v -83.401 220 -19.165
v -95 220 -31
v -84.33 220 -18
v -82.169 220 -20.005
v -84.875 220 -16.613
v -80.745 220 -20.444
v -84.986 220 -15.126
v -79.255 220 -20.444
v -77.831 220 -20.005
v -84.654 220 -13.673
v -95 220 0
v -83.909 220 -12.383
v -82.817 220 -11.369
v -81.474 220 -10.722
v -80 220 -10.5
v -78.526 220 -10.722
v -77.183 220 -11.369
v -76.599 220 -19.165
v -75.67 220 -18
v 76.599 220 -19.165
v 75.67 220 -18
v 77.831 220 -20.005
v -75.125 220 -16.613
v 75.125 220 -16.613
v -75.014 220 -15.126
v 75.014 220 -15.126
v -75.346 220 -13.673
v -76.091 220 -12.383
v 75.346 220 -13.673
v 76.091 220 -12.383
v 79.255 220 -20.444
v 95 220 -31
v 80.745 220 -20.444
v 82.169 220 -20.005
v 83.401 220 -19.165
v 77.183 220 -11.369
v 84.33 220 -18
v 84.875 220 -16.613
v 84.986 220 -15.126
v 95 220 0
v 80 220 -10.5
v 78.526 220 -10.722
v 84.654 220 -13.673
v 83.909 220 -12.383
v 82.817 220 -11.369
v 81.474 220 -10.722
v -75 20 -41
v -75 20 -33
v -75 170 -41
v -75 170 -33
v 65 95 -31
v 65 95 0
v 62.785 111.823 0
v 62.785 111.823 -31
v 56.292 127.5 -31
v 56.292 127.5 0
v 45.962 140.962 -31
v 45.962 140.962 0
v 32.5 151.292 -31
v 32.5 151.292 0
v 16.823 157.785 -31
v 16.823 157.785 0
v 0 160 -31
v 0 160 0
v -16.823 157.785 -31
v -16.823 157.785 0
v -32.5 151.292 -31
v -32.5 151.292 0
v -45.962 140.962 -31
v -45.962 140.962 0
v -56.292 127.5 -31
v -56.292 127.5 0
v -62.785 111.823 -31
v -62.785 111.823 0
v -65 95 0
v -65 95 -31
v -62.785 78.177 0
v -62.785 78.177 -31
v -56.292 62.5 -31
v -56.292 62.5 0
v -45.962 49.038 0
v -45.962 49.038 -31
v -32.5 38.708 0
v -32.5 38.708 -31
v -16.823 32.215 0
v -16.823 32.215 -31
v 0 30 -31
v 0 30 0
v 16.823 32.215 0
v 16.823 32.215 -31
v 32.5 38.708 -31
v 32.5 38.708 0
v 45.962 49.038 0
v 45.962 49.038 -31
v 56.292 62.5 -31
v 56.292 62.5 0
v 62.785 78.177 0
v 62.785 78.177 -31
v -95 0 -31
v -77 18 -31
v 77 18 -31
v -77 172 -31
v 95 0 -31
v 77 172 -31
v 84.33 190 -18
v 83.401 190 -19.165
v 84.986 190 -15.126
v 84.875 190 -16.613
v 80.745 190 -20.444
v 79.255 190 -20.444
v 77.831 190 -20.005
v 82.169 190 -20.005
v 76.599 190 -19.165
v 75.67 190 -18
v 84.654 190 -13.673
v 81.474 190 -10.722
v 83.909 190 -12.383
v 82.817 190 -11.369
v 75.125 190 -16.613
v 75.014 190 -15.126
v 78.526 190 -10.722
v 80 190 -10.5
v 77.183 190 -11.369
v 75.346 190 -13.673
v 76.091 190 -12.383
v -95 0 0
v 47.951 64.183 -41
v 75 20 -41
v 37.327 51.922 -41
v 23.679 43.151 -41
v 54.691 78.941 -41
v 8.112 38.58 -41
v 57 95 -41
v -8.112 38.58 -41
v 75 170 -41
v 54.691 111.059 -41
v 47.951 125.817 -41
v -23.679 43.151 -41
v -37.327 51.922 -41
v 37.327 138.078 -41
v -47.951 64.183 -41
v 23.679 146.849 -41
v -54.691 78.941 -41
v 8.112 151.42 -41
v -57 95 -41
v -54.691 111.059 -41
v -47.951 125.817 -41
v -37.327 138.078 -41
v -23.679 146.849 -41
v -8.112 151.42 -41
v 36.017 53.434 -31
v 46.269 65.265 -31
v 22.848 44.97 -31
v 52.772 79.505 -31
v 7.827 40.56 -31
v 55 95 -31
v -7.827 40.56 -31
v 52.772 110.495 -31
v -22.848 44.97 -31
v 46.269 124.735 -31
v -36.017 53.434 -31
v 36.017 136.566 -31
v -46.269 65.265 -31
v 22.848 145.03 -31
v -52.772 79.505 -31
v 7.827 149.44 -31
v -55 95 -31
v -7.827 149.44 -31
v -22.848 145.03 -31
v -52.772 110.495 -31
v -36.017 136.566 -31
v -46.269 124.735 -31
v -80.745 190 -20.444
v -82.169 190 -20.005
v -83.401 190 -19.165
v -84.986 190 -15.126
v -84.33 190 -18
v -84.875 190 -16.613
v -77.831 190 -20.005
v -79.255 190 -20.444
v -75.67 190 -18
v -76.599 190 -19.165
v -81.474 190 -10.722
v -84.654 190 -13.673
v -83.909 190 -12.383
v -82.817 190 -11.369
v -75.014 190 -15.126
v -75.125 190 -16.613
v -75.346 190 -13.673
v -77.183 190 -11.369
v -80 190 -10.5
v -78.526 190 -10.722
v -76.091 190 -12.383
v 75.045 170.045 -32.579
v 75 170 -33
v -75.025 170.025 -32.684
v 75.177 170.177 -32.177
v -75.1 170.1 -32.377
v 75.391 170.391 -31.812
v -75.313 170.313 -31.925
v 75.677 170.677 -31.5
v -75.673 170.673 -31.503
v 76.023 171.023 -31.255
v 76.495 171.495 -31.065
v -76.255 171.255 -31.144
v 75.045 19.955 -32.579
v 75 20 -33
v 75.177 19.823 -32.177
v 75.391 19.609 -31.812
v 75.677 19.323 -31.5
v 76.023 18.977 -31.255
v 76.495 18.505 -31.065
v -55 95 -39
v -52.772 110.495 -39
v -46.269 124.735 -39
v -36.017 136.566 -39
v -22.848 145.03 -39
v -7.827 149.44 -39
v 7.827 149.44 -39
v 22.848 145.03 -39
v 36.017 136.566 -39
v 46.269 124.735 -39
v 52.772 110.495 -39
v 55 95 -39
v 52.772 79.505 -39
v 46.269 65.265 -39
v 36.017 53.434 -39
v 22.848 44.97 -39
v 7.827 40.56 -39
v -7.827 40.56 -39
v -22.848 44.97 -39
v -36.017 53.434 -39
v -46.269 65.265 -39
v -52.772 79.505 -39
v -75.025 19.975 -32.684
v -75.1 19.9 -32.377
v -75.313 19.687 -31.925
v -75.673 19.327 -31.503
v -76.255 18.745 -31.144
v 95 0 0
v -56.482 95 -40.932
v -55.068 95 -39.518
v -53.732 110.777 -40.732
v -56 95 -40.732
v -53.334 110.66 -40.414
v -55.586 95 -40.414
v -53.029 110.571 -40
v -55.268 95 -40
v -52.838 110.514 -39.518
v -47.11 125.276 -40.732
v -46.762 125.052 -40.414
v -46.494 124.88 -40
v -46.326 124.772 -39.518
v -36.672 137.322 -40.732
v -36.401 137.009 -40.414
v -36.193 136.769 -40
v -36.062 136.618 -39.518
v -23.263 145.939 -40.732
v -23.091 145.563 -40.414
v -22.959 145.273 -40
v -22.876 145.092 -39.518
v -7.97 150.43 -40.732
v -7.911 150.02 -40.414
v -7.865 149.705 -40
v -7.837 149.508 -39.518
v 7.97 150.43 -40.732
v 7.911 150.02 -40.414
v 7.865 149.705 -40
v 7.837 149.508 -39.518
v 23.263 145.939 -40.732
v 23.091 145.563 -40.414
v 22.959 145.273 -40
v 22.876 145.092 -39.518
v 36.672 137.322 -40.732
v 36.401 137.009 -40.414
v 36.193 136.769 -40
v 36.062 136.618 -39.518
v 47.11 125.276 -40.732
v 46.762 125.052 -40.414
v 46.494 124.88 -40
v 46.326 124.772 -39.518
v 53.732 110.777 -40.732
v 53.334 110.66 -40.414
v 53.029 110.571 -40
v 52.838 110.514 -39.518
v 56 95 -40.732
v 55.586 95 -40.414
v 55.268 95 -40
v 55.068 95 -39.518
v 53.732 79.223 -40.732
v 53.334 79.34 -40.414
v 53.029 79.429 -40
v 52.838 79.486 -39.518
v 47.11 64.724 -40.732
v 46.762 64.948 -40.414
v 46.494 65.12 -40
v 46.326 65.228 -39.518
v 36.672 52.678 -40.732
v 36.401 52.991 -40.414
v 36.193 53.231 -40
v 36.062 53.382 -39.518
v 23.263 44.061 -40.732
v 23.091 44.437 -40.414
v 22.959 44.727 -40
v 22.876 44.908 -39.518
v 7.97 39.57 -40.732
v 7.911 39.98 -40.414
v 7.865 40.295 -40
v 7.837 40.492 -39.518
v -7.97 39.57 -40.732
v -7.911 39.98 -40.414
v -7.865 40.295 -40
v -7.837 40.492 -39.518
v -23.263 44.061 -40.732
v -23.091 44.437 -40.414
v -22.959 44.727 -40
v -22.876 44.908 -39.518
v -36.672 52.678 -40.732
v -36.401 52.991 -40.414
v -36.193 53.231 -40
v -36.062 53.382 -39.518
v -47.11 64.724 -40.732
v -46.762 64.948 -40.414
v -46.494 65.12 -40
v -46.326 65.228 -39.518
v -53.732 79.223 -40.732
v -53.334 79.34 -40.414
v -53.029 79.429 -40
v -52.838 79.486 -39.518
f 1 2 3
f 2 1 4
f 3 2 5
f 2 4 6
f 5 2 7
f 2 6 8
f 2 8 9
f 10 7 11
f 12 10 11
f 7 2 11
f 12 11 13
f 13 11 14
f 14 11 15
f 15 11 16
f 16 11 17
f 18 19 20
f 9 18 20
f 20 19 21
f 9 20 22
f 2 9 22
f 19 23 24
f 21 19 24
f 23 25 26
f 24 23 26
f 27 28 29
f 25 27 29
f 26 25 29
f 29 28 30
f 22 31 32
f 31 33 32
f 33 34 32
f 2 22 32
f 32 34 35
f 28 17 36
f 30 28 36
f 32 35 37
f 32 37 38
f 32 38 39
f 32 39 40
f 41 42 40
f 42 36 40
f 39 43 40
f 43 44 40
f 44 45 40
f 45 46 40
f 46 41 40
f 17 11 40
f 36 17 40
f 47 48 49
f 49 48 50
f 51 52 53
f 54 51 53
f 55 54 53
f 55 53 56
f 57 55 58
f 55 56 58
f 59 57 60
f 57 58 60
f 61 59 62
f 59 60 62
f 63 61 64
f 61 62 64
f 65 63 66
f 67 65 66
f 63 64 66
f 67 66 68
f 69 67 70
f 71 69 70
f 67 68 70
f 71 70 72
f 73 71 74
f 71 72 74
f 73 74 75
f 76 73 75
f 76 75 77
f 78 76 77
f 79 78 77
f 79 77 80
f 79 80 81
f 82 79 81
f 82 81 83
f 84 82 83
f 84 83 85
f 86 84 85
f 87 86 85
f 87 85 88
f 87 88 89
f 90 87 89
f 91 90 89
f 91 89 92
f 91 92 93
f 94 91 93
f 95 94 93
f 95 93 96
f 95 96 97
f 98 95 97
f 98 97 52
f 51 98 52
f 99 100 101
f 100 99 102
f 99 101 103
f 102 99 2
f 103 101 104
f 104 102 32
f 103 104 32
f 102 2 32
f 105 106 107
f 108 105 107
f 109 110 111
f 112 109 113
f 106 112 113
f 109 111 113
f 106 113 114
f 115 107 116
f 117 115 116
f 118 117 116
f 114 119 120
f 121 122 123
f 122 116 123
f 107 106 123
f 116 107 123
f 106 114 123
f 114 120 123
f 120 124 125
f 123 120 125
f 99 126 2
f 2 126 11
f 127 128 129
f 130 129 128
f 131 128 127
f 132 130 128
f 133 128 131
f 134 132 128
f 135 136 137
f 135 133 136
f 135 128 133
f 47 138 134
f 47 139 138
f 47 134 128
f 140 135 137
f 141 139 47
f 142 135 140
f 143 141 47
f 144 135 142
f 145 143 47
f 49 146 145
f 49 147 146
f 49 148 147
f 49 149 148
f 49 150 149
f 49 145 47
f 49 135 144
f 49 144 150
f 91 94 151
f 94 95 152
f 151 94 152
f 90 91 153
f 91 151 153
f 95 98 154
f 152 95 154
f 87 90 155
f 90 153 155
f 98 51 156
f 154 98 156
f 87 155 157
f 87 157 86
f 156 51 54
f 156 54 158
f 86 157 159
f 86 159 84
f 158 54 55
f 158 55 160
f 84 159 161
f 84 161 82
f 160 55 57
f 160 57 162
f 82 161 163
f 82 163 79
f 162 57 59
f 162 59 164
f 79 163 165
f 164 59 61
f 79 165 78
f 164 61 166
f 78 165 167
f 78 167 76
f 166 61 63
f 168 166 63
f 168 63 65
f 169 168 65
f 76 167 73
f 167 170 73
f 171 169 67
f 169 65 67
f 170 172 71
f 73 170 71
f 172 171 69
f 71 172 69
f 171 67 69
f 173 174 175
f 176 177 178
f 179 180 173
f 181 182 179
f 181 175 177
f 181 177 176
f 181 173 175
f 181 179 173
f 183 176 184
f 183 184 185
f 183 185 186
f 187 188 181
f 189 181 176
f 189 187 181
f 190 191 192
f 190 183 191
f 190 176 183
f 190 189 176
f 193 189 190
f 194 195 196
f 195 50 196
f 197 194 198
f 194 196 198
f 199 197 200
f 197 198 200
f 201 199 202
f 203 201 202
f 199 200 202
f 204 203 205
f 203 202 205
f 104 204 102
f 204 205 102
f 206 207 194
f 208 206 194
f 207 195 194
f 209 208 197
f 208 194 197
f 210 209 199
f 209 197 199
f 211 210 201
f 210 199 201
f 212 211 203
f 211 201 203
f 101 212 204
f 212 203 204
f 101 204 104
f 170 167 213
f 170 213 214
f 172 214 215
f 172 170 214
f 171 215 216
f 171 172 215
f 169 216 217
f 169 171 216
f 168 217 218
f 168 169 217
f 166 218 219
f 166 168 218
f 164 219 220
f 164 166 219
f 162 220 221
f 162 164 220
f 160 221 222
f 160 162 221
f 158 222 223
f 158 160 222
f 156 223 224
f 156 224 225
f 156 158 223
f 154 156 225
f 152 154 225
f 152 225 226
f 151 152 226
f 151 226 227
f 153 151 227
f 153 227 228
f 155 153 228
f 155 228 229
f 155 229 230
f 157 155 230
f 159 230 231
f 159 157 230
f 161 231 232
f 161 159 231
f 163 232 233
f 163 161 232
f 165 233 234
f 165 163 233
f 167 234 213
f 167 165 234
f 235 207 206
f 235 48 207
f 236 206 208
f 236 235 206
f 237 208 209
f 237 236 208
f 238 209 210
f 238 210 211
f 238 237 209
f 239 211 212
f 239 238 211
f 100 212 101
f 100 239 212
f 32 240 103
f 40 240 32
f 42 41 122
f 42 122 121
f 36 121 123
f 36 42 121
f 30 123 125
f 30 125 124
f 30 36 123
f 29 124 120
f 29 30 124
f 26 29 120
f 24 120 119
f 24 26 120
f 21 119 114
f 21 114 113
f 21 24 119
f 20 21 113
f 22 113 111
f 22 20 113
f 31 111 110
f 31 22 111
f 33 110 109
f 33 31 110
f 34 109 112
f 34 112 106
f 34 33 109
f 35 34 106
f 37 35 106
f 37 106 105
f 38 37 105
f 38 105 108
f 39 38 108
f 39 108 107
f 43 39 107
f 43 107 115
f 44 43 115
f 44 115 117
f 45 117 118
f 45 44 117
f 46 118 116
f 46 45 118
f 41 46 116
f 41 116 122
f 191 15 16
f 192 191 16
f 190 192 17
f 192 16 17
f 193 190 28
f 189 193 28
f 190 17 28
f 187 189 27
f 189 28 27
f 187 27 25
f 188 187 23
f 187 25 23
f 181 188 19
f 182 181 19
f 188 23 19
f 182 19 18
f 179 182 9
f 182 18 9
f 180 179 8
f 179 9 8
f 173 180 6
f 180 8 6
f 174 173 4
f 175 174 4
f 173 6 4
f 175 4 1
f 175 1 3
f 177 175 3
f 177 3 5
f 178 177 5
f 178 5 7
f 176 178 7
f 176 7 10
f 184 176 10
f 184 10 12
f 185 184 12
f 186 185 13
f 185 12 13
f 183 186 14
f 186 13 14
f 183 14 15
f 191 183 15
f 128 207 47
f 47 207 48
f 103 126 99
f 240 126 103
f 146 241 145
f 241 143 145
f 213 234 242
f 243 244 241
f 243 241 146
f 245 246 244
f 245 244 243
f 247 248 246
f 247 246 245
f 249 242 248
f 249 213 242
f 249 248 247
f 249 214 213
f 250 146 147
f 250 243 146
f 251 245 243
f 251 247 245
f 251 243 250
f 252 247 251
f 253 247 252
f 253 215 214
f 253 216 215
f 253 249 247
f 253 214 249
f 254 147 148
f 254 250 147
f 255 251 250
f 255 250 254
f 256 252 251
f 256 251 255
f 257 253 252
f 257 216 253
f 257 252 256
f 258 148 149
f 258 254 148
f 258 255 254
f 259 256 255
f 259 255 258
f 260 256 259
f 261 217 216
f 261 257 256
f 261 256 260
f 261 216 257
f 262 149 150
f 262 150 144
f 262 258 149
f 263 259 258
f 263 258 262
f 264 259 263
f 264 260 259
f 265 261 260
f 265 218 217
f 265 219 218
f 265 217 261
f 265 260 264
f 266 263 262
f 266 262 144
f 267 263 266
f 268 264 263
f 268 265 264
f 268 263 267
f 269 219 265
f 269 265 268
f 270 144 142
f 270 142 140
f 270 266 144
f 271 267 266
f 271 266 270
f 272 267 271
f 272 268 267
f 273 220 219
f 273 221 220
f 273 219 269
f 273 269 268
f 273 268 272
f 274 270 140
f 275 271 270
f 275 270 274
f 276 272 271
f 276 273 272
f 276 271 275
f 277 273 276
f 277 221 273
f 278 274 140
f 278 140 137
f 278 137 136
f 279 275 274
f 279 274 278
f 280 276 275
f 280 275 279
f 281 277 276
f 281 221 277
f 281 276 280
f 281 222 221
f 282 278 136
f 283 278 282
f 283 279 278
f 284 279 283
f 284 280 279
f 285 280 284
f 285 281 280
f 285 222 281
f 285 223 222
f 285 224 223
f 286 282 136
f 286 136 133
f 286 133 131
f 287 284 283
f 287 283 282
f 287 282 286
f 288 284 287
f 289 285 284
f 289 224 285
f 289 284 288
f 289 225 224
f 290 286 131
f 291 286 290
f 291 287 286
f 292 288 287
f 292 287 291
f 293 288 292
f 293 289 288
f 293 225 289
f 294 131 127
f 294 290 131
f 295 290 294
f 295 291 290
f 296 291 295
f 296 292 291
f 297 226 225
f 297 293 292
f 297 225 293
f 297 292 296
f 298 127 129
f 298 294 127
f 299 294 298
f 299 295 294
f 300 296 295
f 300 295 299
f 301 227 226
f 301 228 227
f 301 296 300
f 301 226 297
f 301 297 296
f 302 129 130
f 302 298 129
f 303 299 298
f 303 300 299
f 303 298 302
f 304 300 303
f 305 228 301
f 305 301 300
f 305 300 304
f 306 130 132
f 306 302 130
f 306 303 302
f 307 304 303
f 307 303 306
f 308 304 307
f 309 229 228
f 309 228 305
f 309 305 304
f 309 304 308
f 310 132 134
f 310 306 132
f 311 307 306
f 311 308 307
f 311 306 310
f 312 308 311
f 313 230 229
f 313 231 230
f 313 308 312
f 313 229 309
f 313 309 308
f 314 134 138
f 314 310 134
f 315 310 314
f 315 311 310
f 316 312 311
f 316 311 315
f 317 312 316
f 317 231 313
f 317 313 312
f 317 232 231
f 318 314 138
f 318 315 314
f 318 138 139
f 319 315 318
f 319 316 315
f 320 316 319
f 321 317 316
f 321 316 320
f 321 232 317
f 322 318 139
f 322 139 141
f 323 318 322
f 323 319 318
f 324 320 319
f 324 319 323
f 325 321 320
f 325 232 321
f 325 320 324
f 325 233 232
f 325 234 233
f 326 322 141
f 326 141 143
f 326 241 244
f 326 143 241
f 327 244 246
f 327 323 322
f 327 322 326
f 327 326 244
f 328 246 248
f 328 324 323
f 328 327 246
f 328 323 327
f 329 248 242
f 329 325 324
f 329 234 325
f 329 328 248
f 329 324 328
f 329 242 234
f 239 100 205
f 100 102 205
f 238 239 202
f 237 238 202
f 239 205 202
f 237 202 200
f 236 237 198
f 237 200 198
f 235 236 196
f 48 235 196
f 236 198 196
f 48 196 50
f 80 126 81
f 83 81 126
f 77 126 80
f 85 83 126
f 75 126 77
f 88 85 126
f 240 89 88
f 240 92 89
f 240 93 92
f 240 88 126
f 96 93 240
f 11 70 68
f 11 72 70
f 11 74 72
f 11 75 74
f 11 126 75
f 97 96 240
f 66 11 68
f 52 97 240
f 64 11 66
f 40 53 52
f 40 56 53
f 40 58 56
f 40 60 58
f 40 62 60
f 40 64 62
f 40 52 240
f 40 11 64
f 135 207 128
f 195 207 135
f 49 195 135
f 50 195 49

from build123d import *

# Parameters (mm, degrees)
ESQUISSE1_W             = 190
ESQUISSE1_H             = 220
BOSS_EXTRU_1_DEPTH      = 31
ESQUISSE2_R             = 65
ENL_V_MAT_EXTRU_1_DEPTH = 38
ESQUISSE3_R             = 5
ENL_V_MAT_EXTRU_2_DEPTH = 30
ESQUISSE4_W             = 150
ESQUISSE4_H             = 150
ESQUISSE4_R             = 55
BOSS_EXTRU_2_DEPTH      = 10
CONG_1_R                = 2
CONG_2_R                = 2


with BuildPart() as part:
    # Esquisse1 → Boss.-Extru.1 (new body)
    with BuildSketch(Plane.XY):
        with Locations((0, 110)):
            Rectangle(ESQUISSE1_W, ESQUISSE1_H)
    extrude(amount=-BOSS_EXTRU_1_DEPTH)

    # Esquisse2 → Enlèv. mat.-Extru.1 (cut)
    with BuildSketch(Plane.XY):
        with Locations((0, 95)):
            Circle(ESQUISSE2_R)
    extrude(amount=-ENL_V_MAT_EXTRU_1_DEPTH, mode=Mode.SUBTRACT)

    # Esquisse3 → Enlèv. mat.-Extru.2 (cut)
    with BuildSketch(Plane(origin=(0, 220, 0), x_dir=(1, 0, 0), z_dir=(0, 1, 0))):
        with Locations(Location((-80, 15.5, 0), (0, 0, 270))):
            Circle(ESQUISSE3_R)
    enl_v_mat_extru_2 = extrude(amount=-ENL_V_MAT_EXTRU_2_DEPTH, mode=Mode.SUBTRACT)

    # Symétrie1: Enlèv. mat.-Extru.2 across plane
    add(enl_v_mat_extru_2.mirror(Plane(origin=(0, 0, 0), x_dir=(0, 0, 1), z_dir=(1, 0, 0))), mode=Mode.SUBTRACT)

    # Esquisse4 → Boss.-Extru.2 (add)
    with BuildSketch(Plane(origin=(0, 0, -31), x_dir=(-1, 0, 0), z_dir=(0, 0, -1))):
        with Locations((0, 95)):
            Rectangle(ESQUISSE4_W, ESQUISSE4_H)
        with Locations((0, 95)):
            Circle(ESQUISSE4_R, mode=Mode.SUBTRACT)
    extrude(amount=BOSS_EXTRU_2_DEPTH)

    # Congé1
    cong_1_edges = [part.edges().sort_by_distance(p)[0] for p in [
        (-75, 95, -31),
        (0, 170, -31),
        (75, 95, -31),
        (0, 20, -31),
    ]]
    fillet(cong_1_edges, radius=CONG_1_R)

    # Congé2
    cong_2_edges = [part.edges().sort_by_distance(p)[0] for p in [
        (55, 95, -41),
    ]]
    fillet(cong_2_edges, radius=CONG_2_R)


solid = part.part
